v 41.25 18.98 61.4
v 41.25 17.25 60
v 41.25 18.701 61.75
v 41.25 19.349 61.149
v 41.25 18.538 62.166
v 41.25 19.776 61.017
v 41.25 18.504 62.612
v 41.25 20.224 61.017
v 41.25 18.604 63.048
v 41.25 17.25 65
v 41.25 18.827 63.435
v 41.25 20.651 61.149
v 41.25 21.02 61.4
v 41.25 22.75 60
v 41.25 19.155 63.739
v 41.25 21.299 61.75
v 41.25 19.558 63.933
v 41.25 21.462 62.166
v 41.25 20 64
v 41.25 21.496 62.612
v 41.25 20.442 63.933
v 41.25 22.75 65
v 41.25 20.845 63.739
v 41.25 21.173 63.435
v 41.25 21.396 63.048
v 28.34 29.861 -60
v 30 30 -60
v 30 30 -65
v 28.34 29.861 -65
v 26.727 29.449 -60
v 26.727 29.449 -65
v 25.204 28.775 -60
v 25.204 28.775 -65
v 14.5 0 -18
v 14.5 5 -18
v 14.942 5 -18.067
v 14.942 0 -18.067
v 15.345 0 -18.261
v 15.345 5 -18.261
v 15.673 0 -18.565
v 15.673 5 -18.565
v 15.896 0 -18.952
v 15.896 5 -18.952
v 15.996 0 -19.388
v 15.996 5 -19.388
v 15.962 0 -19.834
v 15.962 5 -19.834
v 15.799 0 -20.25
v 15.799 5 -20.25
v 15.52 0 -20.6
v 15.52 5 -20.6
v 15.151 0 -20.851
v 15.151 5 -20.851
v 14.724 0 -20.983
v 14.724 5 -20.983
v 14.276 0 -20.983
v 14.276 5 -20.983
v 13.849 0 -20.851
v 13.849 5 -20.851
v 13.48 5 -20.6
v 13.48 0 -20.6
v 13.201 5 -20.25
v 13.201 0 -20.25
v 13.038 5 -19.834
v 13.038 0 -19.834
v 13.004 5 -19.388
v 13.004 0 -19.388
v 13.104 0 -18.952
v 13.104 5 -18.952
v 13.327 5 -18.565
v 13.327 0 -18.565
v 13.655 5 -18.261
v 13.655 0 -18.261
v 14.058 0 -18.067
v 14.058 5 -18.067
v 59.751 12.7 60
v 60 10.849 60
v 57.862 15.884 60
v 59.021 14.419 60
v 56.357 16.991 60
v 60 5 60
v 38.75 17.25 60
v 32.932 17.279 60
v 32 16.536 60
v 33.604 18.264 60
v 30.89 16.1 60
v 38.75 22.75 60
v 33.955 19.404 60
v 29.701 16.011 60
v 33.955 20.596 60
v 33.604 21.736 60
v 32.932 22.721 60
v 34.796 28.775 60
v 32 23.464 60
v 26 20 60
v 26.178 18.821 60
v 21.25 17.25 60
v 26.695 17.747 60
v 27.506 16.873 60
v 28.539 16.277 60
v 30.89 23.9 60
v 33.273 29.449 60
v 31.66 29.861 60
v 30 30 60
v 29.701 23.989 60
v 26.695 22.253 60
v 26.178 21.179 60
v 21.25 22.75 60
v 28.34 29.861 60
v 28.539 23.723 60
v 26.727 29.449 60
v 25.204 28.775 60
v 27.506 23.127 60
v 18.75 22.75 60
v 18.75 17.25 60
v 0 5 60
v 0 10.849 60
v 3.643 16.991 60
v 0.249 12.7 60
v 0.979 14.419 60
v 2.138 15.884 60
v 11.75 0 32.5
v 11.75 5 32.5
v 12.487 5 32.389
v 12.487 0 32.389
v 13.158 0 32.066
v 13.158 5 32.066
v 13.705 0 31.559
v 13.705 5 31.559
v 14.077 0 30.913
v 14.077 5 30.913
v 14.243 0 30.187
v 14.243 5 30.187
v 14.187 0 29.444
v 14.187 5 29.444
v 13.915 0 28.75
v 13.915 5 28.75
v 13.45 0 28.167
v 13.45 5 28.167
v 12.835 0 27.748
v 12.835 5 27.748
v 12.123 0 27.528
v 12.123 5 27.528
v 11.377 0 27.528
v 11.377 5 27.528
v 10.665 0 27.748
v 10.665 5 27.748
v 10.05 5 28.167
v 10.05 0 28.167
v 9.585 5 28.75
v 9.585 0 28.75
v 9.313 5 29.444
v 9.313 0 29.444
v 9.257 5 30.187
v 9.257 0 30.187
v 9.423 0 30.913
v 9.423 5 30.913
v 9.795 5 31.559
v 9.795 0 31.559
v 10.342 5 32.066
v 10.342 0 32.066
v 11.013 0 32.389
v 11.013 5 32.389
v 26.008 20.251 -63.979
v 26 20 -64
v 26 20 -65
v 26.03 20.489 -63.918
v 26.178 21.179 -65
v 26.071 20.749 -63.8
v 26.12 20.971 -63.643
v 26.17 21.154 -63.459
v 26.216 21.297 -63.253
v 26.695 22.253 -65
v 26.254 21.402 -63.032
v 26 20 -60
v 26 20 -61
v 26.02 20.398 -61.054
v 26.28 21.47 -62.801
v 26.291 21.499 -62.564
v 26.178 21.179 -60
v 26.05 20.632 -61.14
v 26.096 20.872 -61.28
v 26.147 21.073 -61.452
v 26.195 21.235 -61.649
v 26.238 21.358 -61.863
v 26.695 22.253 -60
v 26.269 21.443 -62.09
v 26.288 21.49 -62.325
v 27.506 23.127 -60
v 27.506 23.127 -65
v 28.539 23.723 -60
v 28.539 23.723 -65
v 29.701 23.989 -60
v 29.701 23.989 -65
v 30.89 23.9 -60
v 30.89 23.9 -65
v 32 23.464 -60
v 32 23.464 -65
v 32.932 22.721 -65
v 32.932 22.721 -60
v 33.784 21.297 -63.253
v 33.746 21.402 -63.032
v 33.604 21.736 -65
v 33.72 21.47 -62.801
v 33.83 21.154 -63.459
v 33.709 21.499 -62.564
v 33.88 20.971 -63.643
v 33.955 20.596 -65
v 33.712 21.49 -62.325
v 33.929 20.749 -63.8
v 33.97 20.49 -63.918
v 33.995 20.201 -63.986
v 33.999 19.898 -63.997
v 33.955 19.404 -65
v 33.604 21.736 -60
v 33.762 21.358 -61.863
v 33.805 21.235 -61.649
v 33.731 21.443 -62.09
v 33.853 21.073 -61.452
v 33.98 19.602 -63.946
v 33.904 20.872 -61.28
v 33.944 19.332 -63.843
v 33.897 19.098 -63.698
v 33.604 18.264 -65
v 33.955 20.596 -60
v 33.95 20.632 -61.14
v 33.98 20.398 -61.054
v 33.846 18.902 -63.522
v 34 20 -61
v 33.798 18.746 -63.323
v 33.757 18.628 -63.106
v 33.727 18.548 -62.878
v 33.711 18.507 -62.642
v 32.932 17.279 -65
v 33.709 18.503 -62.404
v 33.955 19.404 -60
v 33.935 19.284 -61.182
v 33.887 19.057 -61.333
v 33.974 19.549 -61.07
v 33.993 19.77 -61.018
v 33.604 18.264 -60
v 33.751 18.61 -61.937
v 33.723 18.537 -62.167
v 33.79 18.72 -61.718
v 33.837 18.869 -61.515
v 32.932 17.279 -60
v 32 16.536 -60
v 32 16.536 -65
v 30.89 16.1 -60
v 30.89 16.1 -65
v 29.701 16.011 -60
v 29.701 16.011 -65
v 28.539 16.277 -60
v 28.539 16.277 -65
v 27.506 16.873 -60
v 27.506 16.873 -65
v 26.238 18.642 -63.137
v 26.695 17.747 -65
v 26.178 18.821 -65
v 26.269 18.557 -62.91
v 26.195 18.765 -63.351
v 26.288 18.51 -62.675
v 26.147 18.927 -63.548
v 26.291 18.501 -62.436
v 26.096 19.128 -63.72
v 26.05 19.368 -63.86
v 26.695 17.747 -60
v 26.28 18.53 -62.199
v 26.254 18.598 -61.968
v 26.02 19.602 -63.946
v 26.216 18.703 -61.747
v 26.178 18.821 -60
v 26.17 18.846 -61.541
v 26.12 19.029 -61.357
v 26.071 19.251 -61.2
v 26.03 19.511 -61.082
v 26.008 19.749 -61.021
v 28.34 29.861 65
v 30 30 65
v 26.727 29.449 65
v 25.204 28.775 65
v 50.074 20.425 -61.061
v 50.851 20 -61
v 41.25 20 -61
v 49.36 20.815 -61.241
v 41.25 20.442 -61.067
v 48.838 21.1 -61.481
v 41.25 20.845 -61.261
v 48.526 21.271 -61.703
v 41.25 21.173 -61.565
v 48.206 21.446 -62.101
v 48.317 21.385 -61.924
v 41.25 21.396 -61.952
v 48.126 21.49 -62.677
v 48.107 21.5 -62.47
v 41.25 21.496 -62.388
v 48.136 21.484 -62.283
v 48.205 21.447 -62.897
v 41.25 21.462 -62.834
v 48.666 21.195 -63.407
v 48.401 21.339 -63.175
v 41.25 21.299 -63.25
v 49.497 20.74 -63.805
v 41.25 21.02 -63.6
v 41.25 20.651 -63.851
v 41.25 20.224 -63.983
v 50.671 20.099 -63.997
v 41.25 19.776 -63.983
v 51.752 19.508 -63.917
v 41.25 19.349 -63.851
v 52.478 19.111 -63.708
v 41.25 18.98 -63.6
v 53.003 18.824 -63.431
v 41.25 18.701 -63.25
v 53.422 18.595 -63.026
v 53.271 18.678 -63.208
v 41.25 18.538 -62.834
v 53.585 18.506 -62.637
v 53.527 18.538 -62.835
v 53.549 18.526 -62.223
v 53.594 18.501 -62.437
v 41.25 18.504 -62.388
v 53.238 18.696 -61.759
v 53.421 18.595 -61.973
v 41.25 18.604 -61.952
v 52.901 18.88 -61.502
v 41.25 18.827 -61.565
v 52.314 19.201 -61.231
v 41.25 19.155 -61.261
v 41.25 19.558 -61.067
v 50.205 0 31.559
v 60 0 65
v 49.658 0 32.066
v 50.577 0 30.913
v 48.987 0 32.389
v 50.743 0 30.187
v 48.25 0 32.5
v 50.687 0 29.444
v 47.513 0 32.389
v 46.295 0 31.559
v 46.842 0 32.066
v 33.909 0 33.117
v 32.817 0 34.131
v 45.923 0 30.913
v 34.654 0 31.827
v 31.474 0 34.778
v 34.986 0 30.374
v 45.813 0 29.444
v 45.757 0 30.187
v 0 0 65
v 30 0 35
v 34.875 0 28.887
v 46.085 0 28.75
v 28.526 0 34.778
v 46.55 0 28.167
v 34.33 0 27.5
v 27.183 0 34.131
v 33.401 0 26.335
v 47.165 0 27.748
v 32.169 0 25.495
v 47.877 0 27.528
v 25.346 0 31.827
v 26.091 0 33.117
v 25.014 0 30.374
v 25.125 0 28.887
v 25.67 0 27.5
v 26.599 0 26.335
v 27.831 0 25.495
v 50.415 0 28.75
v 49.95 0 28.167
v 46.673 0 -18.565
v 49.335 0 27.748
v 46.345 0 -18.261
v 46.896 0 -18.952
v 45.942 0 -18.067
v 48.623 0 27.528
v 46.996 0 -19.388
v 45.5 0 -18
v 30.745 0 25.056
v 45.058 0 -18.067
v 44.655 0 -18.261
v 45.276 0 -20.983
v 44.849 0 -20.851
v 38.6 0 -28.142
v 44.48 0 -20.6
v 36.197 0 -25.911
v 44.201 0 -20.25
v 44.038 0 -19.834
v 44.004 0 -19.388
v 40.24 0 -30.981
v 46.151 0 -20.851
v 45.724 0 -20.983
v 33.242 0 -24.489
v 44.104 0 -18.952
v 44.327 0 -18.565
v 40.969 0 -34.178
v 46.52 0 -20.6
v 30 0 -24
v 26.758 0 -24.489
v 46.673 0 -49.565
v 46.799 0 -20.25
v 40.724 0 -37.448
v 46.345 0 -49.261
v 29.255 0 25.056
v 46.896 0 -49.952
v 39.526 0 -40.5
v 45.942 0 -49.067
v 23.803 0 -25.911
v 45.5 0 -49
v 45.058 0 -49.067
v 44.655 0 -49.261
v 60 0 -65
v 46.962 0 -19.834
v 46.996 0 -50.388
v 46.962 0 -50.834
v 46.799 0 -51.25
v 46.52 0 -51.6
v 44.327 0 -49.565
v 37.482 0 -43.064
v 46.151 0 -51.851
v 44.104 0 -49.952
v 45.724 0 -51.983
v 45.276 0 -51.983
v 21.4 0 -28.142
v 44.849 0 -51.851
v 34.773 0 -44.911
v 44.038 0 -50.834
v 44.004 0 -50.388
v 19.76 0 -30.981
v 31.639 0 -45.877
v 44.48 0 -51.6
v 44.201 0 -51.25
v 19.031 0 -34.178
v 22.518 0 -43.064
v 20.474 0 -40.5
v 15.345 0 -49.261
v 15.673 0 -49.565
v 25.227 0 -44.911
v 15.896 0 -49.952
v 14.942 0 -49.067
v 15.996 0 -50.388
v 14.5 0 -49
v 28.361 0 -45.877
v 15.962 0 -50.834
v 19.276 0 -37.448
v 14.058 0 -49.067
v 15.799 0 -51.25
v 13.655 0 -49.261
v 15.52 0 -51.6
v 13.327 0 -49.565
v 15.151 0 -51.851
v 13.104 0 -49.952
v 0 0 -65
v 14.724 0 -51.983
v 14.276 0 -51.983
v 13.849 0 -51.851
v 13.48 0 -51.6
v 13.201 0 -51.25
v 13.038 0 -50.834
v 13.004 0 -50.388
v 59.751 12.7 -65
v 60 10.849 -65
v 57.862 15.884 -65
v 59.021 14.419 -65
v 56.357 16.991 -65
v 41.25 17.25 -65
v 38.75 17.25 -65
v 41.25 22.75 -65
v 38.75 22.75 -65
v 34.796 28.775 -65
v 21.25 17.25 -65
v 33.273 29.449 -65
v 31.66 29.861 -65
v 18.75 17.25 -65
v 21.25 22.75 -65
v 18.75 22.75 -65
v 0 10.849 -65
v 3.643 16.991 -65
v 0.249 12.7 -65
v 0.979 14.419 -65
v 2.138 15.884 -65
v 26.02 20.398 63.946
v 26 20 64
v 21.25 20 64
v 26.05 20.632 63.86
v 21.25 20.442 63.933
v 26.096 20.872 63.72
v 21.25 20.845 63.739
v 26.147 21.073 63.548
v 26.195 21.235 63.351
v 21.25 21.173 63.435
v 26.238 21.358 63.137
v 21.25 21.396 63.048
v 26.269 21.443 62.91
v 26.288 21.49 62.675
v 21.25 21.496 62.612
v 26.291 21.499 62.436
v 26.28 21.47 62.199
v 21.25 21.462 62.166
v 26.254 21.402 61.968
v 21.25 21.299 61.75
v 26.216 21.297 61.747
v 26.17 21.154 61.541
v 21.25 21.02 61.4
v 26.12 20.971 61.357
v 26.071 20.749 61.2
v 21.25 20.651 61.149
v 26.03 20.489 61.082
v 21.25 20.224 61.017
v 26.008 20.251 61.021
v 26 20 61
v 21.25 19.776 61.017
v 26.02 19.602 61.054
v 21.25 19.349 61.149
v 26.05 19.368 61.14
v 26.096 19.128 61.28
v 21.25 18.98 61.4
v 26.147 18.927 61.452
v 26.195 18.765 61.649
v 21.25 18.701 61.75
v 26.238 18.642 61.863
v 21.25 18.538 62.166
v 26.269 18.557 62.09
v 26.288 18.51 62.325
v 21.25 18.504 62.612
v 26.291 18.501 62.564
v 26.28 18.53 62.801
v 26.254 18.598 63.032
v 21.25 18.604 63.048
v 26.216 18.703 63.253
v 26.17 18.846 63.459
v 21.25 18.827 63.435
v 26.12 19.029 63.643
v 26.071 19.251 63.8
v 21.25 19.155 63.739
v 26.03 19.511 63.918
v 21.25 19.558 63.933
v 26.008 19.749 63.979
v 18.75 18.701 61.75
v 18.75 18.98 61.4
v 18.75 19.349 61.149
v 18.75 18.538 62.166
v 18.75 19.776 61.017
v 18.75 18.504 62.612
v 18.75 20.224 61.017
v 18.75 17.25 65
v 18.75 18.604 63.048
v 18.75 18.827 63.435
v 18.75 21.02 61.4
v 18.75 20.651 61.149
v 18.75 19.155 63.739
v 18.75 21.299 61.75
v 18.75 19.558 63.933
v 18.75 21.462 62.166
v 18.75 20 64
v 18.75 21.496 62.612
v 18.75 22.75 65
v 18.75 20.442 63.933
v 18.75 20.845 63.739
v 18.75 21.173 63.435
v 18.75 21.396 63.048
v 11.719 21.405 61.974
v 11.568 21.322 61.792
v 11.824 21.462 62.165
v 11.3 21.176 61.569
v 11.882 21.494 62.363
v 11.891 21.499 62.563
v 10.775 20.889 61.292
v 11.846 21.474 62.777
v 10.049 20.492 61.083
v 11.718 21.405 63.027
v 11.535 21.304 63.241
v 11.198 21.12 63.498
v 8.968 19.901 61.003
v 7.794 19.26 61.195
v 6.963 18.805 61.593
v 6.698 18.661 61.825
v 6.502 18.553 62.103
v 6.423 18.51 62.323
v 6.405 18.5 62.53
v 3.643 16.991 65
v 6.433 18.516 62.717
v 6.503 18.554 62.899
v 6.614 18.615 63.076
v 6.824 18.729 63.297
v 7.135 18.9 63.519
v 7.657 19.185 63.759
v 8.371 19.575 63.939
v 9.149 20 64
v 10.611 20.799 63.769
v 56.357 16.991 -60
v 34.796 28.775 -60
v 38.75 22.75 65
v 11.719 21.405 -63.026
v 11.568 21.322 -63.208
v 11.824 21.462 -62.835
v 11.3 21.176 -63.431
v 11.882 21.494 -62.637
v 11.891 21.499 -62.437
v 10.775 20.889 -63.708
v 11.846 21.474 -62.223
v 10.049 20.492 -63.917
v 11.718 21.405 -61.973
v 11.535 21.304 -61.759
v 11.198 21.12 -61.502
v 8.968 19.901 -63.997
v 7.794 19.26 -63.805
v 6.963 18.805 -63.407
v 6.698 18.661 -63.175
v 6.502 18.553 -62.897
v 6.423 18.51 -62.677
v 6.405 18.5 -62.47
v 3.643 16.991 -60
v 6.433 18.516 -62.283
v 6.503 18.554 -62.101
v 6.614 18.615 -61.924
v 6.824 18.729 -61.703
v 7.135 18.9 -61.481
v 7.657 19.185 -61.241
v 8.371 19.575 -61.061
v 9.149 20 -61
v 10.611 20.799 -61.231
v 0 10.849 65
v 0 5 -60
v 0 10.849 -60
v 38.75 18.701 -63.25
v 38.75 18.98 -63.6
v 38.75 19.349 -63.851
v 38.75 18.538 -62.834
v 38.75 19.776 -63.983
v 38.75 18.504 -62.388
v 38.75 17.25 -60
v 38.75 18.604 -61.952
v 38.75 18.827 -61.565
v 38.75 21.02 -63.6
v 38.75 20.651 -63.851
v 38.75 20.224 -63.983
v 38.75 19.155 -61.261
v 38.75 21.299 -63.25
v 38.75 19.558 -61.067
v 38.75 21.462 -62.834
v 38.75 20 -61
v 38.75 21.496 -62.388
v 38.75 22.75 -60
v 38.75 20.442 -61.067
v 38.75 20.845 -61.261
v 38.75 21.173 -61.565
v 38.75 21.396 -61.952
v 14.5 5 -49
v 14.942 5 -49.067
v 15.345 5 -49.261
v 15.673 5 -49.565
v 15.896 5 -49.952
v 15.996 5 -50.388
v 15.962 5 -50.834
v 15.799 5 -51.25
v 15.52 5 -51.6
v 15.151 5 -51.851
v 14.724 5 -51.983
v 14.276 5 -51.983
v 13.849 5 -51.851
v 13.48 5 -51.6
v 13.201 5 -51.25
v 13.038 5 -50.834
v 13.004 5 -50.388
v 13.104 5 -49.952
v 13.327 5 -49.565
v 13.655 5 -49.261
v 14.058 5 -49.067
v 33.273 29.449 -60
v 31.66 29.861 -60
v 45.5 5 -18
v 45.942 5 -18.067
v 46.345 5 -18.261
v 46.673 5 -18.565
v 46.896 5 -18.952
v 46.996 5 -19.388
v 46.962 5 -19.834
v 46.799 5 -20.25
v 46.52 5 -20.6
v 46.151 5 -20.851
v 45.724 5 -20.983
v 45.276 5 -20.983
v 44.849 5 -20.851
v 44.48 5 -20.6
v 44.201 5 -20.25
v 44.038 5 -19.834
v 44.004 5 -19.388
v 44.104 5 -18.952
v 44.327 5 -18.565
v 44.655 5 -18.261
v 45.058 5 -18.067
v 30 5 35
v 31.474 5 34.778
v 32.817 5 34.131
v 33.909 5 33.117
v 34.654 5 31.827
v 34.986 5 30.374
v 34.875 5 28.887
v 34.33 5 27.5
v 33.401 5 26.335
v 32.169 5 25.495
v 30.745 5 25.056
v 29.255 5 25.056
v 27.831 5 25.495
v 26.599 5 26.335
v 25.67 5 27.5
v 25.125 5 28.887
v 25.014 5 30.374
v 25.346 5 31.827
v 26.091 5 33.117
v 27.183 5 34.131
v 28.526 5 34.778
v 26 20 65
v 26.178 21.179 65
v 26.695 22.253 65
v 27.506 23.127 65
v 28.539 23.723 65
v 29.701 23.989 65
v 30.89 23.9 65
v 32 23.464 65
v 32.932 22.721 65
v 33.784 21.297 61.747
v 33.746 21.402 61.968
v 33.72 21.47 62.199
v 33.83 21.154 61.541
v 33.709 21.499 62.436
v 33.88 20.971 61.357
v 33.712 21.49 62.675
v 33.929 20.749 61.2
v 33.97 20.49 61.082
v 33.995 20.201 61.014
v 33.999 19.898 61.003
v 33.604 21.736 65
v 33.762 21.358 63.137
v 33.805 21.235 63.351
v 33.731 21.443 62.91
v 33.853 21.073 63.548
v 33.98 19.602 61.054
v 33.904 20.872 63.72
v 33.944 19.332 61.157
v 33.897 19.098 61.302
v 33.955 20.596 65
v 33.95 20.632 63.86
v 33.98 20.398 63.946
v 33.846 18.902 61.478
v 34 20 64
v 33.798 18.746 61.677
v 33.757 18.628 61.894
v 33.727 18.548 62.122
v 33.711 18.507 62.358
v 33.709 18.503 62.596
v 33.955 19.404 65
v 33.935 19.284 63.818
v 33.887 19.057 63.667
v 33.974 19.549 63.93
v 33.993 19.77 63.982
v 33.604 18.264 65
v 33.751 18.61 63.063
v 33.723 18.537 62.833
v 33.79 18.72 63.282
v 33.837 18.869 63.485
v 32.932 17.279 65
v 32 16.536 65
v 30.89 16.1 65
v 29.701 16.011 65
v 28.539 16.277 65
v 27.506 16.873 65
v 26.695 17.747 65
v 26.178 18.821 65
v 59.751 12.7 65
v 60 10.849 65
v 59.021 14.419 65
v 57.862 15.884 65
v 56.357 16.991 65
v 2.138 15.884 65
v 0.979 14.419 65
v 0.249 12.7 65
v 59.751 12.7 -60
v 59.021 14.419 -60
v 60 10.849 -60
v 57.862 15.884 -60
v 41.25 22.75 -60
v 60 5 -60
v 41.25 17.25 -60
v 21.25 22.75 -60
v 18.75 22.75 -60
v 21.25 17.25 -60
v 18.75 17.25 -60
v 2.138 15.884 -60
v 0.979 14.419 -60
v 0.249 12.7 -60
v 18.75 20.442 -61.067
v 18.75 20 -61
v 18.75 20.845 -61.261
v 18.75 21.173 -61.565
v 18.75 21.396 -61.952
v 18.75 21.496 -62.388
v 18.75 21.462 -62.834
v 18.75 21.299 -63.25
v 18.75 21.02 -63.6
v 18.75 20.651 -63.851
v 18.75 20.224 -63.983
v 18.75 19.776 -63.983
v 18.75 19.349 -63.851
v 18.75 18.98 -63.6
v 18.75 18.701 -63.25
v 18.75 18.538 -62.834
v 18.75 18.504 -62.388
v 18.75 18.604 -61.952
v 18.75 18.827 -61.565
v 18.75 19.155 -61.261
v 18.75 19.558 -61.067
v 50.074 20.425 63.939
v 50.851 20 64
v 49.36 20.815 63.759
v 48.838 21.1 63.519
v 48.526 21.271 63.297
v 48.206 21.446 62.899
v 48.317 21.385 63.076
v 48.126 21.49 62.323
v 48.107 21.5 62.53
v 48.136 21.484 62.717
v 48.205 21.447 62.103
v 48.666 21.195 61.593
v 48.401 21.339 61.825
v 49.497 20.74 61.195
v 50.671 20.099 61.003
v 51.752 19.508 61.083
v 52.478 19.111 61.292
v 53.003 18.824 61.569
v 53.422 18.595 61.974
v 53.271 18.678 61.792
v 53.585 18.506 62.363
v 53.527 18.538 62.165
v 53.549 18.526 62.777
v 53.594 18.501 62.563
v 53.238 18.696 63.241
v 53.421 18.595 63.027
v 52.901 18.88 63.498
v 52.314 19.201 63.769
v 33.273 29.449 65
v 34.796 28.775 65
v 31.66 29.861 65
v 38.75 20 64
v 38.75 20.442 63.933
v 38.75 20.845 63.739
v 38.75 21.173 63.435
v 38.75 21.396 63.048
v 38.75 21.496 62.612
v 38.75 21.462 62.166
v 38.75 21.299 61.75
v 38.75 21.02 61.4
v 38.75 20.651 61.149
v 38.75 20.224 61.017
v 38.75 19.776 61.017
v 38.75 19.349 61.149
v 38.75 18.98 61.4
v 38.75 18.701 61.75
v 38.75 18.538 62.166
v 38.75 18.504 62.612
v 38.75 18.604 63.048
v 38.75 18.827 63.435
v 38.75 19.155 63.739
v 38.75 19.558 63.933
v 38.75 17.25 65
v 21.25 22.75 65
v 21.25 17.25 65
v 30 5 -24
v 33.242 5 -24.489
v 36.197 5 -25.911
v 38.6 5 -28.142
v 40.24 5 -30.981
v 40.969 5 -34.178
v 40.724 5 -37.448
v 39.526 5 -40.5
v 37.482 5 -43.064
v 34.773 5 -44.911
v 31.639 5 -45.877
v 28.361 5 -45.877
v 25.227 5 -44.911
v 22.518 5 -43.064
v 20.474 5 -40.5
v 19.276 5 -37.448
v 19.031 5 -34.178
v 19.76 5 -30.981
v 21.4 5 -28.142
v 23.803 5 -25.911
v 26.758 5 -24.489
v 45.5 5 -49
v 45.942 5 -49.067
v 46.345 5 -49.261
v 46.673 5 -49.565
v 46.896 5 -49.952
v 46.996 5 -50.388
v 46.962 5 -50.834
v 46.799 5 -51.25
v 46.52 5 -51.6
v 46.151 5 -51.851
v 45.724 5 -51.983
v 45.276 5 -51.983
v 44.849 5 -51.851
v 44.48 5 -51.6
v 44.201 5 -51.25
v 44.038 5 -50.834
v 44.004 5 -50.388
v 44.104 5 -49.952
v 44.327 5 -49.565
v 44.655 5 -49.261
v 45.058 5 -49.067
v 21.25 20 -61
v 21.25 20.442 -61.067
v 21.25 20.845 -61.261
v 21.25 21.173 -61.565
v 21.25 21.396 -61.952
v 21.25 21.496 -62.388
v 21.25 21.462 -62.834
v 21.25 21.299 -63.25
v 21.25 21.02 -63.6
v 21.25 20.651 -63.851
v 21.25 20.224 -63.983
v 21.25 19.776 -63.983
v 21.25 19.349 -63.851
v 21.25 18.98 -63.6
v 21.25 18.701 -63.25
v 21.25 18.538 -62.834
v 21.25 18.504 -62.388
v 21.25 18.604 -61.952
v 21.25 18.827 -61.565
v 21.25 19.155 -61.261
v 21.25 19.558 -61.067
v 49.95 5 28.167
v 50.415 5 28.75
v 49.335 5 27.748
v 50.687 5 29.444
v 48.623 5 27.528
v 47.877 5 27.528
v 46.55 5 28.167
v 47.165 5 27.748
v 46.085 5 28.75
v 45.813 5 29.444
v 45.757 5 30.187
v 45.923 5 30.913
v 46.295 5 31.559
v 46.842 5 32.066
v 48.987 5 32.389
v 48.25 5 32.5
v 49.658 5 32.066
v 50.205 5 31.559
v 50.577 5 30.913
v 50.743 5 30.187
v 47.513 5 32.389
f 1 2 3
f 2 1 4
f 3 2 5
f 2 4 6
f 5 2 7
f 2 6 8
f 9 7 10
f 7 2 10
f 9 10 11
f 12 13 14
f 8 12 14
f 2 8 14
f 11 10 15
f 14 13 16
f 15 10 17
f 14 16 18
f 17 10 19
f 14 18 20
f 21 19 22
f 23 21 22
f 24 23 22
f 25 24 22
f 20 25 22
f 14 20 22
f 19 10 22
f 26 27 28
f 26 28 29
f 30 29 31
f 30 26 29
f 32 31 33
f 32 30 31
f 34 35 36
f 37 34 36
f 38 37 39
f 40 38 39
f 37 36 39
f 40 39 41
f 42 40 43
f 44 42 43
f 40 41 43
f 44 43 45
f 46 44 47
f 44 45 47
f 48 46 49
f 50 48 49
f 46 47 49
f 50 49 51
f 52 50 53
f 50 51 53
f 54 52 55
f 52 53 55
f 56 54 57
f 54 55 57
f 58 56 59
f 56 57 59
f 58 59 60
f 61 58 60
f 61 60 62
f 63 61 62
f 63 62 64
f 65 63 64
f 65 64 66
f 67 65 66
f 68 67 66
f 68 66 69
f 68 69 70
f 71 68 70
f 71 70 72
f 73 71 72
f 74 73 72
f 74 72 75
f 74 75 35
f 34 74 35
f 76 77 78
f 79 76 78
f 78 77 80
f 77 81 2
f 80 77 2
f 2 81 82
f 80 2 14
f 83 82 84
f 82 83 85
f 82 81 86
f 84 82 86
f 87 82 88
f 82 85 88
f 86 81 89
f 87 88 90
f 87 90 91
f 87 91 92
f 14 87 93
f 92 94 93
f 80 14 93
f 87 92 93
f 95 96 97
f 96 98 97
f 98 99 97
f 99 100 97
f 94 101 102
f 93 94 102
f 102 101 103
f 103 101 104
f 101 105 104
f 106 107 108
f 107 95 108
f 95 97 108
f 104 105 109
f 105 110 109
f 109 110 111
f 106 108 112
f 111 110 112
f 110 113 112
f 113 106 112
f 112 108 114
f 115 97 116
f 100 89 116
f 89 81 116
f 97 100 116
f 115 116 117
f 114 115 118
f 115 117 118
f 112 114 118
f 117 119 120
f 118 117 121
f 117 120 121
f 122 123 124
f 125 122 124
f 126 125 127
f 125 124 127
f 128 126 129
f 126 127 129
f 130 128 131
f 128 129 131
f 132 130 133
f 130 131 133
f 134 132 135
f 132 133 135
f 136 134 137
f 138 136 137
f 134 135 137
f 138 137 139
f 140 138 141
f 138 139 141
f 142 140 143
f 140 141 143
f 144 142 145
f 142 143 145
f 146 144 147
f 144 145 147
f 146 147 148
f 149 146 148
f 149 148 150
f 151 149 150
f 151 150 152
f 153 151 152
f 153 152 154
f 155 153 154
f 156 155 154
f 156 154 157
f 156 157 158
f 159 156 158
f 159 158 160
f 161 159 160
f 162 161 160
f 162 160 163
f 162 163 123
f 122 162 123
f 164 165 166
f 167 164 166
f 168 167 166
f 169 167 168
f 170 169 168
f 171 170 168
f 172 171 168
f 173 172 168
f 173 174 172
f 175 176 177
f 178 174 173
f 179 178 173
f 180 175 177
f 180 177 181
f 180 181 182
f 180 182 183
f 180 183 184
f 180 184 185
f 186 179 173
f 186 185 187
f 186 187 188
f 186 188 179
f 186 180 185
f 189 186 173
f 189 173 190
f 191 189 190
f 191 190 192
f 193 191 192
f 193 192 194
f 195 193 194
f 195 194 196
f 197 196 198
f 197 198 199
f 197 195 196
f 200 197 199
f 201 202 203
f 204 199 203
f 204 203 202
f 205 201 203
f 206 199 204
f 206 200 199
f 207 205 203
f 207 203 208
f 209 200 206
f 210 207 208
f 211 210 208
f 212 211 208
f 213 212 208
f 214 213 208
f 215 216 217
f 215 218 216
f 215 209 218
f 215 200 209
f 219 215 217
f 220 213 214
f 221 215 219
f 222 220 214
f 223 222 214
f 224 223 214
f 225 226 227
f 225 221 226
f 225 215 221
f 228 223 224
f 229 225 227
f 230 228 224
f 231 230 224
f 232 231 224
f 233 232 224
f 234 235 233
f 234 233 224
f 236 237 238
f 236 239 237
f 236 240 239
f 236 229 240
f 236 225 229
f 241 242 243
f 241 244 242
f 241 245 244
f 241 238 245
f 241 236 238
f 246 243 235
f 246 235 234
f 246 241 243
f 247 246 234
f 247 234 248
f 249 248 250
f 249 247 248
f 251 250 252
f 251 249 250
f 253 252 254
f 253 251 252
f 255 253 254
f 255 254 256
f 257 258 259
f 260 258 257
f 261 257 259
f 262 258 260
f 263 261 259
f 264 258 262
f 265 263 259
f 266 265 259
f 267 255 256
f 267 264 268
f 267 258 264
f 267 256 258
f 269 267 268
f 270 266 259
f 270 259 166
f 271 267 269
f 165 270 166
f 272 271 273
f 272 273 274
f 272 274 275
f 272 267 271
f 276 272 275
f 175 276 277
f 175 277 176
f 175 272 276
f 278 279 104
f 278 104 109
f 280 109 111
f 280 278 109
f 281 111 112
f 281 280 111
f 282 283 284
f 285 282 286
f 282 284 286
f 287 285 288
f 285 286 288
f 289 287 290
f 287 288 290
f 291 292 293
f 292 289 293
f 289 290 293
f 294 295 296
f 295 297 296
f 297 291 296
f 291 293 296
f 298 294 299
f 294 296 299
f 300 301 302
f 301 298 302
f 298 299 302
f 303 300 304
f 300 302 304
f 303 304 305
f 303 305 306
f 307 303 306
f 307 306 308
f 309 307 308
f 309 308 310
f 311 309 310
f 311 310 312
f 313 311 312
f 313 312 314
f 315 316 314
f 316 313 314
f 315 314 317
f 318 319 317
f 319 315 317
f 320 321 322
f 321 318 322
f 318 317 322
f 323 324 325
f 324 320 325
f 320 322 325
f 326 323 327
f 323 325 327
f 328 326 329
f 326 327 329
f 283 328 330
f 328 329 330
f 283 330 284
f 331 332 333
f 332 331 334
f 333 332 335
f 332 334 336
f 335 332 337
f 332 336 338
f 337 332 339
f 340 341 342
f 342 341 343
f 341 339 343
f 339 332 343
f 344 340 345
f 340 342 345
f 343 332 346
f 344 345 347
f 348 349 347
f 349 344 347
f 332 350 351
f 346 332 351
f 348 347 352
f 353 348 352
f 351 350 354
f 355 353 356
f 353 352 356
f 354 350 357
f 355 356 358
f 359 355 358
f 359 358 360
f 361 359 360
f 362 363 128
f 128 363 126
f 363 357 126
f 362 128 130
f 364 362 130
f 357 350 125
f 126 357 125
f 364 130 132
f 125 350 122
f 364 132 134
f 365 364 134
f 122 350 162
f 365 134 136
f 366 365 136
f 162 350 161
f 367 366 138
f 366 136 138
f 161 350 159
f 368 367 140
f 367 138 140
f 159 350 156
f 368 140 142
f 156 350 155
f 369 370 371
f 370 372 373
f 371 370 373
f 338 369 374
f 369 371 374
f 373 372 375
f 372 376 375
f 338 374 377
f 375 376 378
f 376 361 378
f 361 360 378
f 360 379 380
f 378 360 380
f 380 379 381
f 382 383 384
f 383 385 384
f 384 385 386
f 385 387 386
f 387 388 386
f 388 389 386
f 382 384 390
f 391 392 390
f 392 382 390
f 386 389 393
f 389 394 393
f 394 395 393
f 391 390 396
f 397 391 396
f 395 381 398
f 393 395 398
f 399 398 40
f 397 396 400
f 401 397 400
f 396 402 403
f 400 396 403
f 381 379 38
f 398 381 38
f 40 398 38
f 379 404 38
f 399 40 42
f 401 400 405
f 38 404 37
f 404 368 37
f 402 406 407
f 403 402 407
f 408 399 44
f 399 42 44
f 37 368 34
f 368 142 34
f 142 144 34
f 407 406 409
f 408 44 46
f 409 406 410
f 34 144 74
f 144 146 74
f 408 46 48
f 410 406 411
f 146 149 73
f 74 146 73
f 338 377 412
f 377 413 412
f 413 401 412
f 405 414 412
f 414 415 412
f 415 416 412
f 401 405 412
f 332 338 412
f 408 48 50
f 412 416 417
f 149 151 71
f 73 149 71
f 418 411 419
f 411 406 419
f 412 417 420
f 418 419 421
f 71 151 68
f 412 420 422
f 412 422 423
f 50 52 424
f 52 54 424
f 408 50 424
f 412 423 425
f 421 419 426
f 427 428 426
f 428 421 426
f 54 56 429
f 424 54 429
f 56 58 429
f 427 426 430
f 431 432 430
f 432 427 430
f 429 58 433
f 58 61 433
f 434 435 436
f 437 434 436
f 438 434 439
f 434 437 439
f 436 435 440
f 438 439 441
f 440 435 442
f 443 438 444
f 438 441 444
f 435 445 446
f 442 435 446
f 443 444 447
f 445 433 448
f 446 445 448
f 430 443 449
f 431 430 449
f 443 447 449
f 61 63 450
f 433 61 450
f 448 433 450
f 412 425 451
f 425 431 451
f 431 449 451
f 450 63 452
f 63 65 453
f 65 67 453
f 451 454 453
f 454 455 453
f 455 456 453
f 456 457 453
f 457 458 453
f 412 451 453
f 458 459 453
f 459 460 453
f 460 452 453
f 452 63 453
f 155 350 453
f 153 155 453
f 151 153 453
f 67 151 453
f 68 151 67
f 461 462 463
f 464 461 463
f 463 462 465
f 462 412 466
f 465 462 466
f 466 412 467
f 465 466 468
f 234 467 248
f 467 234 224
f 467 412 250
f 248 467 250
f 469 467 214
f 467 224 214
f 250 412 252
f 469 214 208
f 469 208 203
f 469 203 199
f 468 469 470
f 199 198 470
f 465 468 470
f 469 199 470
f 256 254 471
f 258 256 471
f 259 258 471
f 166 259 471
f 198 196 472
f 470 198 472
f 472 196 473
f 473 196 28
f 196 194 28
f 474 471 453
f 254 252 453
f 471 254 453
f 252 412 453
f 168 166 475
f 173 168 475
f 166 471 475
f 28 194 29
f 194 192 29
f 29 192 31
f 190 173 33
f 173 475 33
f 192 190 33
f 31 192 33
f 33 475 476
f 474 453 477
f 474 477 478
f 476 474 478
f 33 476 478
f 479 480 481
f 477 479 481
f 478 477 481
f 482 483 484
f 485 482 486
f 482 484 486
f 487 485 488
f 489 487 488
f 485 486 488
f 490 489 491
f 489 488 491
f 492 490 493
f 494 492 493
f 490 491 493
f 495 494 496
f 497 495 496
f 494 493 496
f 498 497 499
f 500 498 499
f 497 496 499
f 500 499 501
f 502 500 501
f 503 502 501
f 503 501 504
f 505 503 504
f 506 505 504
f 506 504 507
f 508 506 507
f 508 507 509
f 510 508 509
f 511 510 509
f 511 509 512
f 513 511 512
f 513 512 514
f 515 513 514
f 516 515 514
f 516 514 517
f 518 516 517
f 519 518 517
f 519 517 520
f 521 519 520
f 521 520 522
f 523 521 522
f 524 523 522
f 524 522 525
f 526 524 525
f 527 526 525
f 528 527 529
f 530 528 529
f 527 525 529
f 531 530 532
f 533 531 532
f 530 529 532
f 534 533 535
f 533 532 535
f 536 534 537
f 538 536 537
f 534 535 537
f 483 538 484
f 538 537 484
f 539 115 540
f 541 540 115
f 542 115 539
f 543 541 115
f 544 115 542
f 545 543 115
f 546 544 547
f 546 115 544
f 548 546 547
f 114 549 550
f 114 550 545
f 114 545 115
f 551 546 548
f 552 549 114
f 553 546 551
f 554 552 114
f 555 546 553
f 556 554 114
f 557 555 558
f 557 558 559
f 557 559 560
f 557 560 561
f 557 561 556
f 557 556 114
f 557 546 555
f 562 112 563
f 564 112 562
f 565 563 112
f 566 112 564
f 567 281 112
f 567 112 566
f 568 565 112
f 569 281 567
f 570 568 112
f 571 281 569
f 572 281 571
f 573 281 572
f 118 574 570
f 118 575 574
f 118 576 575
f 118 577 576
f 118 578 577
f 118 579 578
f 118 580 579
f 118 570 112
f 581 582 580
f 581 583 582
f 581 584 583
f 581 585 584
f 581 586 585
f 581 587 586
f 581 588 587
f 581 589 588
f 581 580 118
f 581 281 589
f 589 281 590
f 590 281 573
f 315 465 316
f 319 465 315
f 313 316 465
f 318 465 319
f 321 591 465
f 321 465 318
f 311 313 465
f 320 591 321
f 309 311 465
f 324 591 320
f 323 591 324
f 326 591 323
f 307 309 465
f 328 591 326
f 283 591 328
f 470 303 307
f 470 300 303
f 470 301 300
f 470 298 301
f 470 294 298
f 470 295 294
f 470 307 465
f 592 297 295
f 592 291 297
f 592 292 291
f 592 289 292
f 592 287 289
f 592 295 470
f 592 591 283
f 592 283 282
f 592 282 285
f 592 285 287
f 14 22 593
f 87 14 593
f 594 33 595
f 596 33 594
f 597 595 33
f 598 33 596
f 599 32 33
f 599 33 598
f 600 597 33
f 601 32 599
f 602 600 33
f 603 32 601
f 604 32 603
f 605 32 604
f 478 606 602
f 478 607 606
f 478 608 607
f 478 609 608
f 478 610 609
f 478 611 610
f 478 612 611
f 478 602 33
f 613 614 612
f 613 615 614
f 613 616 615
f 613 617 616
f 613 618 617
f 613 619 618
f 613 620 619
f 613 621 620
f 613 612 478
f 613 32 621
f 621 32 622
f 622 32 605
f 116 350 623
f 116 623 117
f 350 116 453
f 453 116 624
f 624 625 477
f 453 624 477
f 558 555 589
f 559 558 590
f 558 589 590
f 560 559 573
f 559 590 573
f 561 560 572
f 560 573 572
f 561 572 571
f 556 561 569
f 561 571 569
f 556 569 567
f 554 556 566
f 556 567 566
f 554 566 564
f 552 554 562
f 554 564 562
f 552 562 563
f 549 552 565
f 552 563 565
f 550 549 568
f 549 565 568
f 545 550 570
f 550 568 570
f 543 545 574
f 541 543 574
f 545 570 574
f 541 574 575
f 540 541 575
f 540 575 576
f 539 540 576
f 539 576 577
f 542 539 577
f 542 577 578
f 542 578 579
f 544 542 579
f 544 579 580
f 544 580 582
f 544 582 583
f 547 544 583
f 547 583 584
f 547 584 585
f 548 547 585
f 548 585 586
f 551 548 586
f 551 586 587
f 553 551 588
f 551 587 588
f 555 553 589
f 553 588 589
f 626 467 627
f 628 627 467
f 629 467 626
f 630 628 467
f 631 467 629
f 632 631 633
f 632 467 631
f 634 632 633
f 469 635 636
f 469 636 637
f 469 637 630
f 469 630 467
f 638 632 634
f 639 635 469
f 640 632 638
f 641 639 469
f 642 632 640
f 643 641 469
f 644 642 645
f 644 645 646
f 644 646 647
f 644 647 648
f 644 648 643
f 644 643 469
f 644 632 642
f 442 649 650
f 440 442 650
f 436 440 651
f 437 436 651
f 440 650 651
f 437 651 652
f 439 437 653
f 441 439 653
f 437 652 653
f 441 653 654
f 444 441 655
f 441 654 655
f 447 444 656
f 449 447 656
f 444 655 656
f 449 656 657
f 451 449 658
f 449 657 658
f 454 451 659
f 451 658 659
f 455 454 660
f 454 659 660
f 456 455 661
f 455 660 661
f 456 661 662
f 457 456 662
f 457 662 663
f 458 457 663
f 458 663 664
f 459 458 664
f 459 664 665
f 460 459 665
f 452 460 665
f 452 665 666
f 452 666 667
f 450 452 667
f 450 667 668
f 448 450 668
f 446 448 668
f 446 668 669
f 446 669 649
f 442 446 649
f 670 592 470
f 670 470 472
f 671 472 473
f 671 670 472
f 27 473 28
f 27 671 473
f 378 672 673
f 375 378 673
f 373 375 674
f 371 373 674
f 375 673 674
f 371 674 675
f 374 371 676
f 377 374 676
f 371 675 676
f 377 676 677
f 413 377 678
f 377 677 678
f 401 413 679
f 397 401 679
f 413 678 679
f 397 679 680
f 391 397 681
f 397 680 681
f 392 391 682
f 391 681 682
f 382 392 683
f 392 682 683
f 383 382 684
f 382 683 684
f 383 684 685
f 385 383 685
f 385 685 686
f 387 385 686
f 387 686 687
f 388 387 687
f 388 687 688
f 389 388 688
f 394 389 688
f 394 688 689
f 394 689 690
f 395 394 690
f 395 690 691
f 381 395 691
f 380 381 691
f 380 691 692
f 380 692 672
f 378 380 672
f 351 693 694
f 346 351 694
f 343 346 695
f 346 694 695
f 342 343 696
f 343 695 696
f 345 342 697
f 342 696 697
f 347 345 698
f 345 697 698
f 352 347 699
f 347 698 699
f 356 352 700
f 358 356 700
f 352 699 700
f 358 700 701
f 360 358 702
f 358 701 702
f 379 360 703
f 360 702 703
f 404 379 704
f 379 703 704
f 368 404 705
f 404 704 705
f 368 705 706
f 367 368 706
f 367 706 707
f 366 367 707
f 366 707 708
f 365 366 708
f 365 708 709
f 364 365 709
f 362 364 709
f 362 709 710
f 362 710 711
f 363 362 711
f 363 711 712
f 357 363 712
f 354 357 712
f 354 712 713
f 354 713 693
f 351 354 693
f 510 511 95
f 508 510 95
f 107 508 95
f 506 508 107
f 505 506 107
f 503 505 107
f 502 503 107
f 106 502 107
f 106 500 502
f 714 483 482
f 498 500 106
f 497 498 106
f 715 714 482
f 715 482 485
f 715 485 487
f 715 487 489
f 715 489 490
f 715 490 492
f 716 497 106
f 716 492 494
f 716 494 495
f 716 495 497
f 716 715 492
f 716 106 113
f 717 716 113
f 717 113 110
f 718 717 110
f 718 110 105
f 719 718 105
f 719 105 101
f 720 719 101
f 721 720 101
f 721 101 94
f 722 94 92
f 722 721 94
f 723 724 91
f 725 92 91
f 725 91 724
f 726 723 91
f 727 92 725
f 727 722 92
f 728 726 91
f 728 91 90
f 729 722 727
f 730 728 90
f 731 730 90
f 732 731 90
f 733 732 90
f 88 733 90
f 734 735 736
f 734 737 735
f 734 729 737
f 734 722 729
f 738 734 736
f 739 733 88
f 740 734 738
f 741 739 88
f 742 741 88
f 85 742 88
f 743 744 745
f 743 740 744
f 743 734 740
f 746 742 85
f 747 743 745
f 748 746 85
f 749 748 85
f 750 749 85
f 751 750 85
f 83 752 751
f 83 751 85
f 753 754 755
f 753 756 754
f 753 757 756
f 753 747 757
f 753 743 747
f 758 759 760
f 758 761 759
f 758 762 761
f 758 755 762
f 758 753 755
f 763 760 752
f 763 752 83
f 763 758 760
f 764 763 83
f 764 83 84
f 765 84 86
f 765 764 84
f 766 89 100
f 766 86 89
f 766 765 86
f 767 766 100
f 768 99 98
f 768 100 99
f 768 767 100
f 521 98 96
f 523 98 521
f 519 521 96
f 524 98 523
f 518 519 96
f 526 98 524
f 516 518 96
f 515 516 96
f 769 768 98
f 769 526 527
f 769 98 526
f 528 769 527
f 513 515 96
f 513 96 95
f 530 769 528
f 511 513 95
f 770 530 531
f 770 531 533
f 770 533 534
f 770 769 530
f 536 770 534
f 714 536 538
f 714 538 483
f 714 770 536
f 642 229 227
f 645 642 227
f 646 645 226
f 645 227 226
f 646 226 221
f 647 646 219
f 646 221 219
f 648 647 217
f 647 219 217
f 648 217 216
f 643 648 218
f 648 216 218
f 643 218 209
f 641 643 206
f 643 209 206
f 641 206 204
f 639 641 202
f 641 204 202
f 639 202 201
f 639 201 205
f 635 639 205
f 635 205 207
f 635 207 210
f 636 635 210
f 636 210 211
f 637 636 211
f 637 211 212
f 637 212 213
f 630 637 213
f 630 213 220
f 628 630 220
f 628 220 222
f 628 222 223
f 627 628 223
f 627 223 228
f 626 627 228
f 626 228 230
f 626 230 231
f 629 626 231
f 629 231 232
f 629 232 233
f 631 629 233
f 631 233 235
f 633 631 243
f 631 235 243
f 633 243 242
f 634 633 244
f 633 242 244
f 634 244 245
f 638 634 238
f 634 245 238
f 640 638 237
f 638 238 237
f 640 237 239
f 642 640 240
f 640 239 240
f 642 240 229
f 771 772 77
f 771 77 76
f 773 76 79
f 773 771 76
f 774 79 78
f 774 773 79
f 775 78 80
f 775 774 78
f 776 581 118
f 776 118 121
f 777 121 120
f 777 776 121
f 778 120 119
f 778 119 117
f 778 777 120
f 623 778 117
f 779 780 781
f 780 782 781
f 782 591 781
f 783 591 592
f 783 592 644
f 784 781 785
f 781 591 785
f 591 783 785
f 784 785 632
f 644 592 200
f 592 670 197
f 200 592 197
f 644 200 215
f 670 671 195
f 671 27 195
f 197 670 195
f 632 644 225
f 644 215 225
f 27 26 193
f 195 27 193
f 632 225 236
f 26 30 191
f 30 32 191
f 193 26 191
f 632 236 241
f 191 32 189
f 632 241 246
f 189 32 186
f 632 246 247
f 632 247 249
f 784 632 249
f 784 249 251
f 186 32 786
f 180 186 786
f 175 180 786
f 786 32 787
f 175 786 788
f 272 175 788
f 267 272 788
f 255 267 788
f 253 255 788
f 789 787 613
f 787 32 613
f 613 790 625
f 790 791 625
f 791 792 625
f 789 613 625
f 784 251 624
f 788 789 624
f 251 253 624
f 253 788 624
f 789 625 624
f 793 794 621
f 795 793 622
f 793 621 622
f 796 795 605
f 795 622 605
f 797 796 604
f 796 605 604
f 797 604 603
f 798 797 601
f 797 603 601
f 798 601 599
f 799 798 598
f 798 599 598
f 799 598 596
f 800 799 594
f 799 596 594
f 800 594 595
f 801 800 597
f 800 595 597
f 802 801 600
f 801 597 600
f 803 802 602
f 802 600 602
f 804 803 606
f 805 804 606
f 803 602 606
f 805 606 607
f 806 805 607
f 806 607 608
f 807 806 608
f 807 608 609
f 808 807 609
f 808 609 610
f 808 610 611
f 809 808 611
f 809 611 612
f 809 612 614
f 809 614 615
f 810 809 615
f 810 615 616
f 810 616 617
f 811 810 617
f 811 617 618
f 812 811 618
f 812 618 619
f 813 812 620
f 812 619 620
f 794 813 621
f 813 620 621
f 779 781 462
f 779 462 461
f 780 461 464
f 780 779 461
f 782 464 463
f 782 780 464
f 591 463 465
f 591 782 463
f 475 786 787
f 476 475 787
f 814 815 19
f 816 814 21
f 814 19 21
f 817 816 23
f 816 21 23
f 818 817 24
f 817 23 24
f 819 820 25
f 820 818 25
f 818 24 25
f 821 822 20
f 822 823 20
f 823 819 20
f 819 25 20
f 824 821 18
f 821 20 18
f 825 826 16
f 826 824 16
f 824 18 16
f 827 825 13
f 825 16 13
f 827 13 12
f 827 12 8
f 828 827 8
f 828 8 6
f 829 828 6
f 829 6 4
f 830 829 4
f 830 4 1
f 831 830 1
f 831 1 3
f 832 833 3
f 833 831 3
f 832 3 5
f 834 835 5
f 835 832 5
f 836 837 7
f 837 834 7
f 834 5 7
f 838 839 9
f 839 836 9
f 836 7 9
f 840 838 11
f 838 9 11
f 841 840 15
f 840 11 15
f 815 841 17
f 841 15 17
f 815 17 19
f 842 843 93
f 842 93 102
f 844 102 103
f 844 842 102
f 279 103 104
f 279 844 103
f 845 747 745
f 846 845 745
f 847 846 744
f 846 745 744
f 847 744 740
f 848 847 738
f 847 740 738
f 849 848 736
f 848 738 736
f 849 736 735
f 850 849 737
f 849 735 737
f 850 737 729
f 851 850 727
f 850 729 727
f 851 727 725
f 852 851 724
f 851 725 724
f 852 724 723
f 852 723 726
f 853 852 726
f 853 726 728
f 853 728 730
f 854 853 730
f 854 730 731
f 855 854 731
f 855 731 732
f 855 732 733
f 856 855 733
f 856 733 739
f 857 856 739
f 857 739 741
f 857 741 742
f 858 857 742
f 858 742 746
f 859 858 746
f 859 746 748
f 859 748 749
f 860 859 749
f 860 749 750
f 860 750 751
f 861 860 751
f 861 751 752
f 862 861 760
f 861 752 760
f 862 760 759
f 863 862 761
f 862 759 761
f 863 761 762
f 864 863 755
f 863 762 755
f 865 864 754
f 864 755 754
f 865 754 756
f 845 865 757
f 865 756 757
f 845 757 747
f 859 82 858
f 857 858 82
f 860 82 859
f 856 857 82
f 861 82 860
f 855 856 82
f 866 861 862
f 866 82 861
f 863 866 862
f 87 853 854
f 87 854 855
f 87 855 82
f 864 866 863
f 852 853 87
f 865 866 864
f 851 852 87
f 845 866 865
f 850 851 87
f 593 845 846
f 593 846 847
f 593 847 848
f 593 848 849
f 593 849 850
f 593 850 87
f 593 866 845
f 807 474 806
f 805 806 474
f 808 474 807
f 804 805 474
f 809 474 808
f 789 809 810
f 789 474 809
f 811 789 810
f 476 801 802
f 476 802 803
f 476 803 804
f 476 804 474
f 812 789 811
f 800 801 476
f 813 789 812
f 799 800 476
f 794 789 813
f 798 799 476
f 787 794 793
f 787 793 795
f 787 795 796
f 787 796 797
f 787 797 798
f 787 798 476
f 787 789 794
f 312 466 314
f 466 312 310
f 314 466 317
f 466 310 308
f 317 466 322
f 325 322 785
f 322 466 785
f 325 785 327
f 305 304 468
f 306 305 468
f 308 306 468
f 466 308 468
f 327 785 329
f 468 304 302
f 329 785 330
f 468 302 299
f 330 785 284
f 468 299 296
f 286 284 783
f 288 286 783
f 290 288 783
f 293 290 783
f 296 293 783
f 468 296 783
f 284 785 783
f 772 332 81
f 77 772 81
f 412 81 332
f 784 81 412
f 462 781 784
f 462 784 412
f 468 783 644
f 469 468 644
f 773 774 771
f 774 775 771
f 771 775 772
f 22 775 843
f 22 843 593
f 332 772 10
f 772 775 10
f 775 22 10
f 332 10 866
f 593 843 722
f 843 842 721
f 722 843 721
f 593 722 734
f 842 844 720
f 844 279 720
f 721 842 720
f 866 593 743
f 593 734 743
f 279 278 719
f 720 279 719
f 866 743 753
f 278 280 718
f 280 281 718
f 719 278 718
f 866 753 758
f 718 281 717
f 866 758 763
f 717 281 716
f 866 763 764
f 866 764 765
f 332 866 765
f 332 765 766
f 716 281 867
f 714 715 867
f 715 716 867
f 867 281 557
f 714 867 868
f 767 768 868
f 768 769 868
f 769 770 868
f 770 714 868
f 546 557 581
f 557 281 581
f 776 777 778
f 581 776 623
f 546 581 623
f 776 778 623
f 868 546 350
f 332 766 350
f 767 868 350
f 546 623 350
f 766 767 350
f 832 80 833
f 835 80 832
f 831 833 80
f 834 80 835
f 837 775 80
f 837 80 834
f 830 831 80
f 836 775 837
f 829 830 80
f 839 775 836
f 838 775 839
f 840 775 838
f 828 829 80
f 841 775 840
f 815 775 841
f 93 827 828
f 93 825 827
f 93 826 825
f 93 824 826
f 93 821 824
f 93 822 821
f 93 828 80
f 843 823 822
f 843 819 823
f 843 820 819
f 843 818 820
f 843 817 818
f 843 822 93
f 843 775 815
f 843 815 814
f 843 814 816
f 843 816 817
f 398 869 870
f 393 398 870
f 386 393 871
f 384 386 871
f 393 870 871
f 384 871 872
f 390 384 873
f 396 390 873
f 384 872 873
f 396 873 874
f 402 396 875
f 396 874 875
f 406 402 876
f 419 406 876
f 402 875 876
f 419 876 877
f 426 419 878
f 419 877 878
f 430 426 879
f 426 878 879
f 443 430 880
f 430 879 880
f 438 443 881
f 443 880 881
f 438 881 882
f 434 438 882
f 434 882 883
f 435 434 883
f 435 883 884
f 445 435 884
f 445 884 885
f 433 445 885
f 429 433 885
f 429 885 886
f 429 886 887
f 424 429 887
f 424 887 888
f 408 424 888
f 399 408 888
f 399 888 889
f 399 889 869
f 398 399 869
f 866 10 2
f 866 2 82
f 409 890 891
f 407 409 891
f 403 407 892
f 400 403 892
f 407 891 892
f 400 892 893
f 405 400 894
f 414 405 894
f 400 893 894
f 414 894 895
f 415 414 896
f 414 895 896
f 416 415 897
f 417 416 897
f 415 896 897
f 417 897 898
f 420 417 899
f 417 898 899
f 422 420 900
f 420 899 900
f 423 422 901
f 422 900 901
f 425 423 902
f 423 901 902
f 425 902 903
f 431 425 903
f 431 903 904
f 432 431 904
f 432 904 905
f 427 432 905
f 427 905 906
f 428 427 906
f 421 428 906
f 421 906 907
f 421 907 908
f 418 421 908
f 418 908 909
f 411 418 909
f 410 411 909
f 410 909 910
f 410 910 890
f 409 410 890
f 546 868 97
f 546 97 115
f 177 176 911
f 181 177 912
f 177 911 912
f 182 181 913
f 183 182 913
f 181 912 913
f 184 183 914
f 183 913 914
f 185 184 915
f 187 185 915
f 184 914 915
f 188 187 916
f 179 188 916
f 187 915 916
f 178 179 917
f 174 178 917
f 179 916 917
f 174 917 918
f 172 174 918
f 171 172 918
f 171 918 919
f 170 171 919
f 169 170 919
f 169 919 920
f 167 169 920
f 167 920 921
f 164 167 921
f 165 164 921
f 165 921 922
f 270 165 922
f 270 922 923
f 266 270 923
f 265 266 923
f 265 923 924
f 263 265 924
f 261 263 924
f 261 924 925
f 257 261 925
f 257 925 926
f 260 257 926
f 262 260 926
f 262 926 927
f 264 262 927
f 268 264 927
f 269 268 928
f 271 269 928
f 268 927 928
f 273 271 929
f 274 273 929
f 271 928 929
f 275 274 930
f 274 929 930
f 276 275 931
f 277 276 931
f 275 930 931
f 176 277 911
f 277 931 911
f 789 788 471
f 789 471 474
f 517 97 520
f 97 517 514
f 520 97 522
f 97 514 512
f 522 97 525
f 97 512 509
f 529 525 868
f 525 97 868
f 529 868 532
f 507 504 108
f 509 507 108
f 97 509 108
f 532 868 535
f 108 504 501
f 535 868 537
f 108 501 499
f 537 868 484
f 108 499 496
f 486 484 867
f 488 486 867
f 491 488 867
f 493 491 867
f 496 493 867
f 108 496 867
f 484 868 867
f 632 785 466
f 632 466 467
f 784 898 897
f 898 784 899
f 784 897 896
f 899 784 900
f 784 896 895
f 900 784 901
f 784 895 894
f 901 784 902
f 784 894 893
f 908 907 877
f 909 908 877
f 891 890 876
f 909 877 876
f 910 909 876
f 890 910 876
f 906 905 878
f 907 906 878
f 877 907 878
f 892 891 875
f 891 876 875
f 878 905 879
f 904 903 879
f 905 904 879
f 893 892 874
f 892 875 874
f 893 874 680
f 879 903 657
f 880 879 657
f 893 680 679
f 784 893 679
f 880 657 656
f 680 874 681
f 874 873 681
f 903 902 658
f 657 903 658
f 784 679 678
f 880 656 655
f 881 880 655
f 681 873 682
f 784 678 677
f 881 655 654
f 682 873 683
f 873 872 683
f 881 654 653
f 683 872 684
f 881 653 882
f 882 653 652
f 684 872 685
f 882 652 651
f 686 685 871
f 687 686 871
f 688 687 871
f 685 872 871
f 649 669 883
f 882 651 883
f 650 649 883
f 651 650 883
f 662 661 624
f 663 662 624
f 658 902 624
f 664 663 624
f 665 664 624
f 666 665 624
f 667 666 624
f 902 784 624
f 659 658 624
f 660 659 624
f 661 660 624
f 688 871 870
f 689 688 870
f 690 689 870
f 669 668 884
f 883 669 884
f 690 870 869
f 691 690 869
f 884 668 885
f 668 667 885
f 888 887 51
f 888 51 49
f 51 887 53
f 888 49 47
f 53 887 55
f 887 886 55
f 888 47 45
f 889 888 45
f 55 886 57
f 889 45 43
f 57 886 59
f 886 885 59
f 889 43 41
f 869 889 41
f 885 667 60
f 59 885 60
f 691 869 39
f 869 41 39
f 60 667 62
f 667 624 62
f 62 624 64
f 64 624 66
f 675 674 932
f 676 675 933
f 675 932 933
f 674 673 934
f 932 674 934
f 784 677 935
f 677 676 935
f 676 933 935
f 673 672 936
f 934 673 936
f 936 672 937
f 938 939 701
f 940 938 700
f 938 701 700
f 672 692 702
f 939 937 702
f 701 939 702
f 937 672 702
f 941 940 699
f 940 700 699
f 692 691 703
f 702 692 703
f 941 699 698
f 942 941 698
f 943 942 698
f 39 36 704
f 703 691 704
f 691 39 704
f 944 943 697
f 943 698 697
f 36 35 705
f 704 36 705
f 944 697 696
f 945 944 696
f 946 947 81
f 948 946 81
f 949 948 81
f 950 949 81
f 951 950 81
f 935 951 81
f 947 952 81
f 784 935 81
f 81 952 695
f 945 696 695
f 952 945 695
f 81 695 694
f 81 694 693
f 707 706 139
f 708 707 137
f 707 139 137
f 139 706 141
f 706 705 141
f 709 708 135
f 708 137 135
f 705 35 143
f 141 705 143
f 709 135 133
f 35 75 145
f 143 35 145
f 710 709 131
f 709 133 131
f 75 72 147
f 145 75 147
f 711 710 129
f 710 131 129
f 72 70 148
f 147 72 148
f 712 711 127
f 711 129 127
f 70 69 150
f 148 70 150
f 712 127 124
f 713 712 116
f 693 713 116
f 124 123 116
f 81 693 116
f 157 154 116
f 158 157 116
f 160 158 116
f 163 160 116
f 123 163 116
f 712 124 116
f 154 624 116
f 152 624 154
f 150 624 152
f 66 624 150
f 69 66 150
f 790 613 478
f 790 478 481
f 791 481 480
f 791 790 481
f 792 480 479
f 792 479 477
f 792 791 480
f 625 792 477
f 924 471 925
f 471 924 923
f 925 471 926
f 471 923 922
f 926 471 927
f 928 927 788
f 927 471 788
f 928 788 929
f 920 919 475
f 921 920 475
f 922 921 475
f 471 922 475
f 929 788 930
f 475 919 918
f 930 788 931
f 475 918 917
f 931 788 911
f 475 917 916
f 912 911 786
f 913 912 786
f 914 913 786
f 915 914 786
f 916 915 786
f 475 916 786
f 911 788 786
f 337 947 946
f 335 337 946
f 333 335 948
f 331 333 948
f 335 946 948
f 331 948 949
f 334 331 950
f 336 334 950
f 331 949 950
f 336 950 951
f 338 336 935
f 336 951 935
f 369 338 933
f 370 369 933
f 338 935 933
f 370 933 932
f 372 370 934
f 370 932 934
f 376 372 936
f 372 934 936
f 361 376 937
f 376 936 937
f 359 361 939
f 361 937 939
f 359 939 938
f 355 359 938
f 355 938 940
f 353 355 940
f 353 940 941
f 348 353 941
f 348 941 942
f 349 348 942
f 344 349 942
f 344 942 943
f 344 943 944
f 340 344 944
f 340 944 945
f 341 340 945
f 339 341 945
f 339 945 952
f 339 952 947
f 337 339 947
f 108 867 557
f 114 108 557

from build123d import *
from OCP.BRepAlgoAPI import BRepAlgoAPI_Cut
from OCP.TopTools import TopTools_ListOfShape

# Parameters (mm, degrees)
BOSS_EXTRUDE1_DEPTH    = 60
CUT_EXTRUDE1_START     = -130
CUT_EXTRUDE1_OUTLINE_R = 4
CUT_EXTRUDE1_OUTLINE_W = 2.5
CUT_EXTRUDE1_OUTLINE_H = 5.5
CUT_EXTRUDE1_DEPTH     = 130
CUT_EXTRUDE2_REACH     = 93.924
SKETCH3_R              = 11
SKETCH3_R_2            = 1.5
SKETCH3_R_3            = 5
SKETCH3_R_4            = 2.5
SKETCH4_R              = 1.5
CUT_EXTRUDE3_DEPTH     = 94.407708115


with BuildPart() as part:
    # Sketch1 → Boss-Extrude1 (new body)
    with BuildSketch(Plane(origin=(0, 0, 0), x_dir=(0, 0, -1), z_dir=(1, 0, 0))):
        Polygon((-65, 0), (65, 0), (65, 30), (60, 30), (60, 5), (-60, 5), (-60, 30), (-65, 30), align=None)
    extrude(amount=BOSS_EXTRUDE1_DEPTH)


with BuildPart() as cut_extrude1_tool:
    # Cut-Extrude1: read off the stored shape, not the designer's step
    # Cut-Extrude1 outline → Cut-Extrude1 (new body)
    with BuildSketch(Plane(origin=(0, 0, -65), x_dir=(-1, 0, 0), z_dir=(0, 0, -1)).offset(CUT_EXTRUDE1_START)):
        with BuildLine():
            Line((0, 30), (-30, 29.999998923))
            ThreePointArc((-30, 29.999998923), (-27.525092827, 29.688901535), (-25.204173103, 28.774965689))
            Line((-25.204173103, 28.774965689), (-3.642920811, 16.99098415))
            ThreePointArc((-3.642920811, 16.99098415), (-0.979221216, 14.419252925), (0, 10.848507507))
            Line((0, 10.848507507), (0, 30))
        make_face()
        with BuildLine():
            ThreePointArc((-60, 10.848507507), (-59.020778784, 14.419252925), (-56.357079189, 16.99098415))
            Line((-56.357079189, 16.99098415), (-34.795826897, 28.774965689))
            ThreePointArc((-34.795826897, 28.774965689), (-32.474907173, 29.688901535), (-30, 29.999998923))
            Line((-30, 29.999998923), (-60, 30))
            Line((-60, 30), (-60, 10.848507507))
        make_face()
        with Locations((-30, 20)):
            Circle(CUT_EXTRUDE1_OUTLINE_R)
        with Locations((-20, 20)):
            Rectangle(CUT_EXTRUDE1_OUTLINE_W, CUT_EXTRUDE1_OUTLINE_H)
        with Locations((-40, 20)):
            Rectangle(CUT_EXTRUDE1_OUTLINE_W, CUT_EXTRUDE1_OUTLINE_H)
    extrude(amount=CUT_EXTRUDE1_DEPTH)


with BuildPart() as part_1:
    add(part.part)

    # Cut-Extrude1: cut by cut_extrude1_tool, with a tolerance
    cut_extrude1_stock = TopTools_ListOfShape()
    cut_extrude1_stock.Append(part_1.part.wrapped)
    cut_extrude1_tools = TopTools_ListOfShape()
    cut_extrude1_tools.Append(cut_extrude1_tool.part.wrapped)
    cut_extrude1_cut = BRepAlgoAPI_Cut()
    cut_extrude1_cut.SetArguments(cut_extrude1_stock)
    cut_extrude1_cut.SetTools(cut_extrude1_tools)
    cut_extrude1_cut.SetFuzzyValue(0.00001)
    cut_extrude1_cut.Build()
    add(Compound.cast(cut_extrude1_cut.Shape()).solids(), mode=Mode.REPLACE)

    # Sketch3 → Cut-Extrude2 (cut, up to next)
    with BuildSketch(Plane(origin=(0, 5, 0), x_dir=(1, 0, 0), z_dir=(0, 1, 0)), mode=Mode.PRIVATE) as cut_extrude2_sk1:
        with Locations(Location((30, 35, 0), (0, 0, 270))):
            Circle(SKETCH3_R)
    cut_extrude2_tool1 = extrude(cut_extrude2_sk1.sketch, amount=-CUT_EXTRUDE2_REACH, mode=Mode.PRIVATE) & part_1.part
    # Sketch3 → Cut-Extrude2 (cut, up to next)
    with BuildSketch(Plane(origin=(0, 5, 0), x_dir=(1, 0, 0), z_dir=(0, 1, 0)), mode=Mode.PRIVATE) as cut_extrude2_sk2:
        with Locations(Location((45.5, 19.5, 0), (0, 0, 270))):
            Circle(SKETCH3_R_2)
    cut_extrude2_tool2 = extrude(cut_extrude2_sk2.sketch, amount=-CUT_EXTRUDE2_REACH, mode=Mode.PRIVATE) & part_1.part
    # Sketch3 → Cut-Extrude2 (cut, up to next)
    with BuildSketch(Plane(origin=(0, 5, 0), x_dir=(1, 0, 0), z_dir=(0, 1, 0)), mode=Mode.PRIVATE) as cut_extrude2_sk3:
        with Locations(Location((45.5, 50.5, 0), (0, 0, 270))):
            Circle(SKETCH3_R_2)
    cut_extrude2_tool3 = extrude(cut_extrude2_sk3.sketch, amount=-CUT_EXTRUDE2_REACH, mode=Mode.PRIVATE) & part_1.part
    # Sketch3 → Cut-Extrude2 (cut, up to next)
    with BuildSketch(Plane(origin=(0, 5, 0), x_dir=(1, 0, 0), z_dir=(0, 1, 0)), mode=Mode.PRIVATE) as cut_extrude2_sk4:
        with Locations(Location((14.5, 50.5, 0), (0, 0, 270))):
            Circle(SKETCH3_R_2)
    cut_extrude2_tool4 = extrude(cut_extrude2_sk4.sketch, amount=-CUT_EXTRUDE2_REACH, mode=Mode.PRIVATE) & part_1.part
    # Sketch3 → Cut-Extrude2 (cut, up to next)
    with BuildSketch(Plane(origin=(0, 5, 0), x_dir=(1, 0, 0), z_dir=(0, 1, 0)), mode=Mode.PRIVATE) as cut_extrude2_sk5:
        with Locations(Location((14.5, 19.5, 0), (0, 0, 270))):
            Circle(SKETCH3_R_2)
    cut_extrude2_tool5 = extrude(cut_extrude2_sk5.sketch, amount=-CUT_EXTRUDE2_REACH, mode=Mode.PRIVATE) & part_1.part
    # Sketch3 → Cut-Extrude2 (cut, up to next)
    with BuildSketch(Plane(origin=(0, 5, 0), x_dir=(1, 0, 0), z_dir=(0, 1, 0)), mode=Mode.PRIVATE) as cut_extrude2_sk6:
        with Locations(Location((30, -30, 0), (0, 0, 270))):
            Circle(SKETCH3_R_3)
    cut_extrude2_tool6 = extrude(cut_extrude2_sk6.sketch, amount=-CUT_EXTRUDE2_REACH, mode=Mode.PRIVATE) & part_1.part
    # Sketch3 → Cut-Extrude2 (cut, up to next)
    with BuildSketch(Plane(origin=(0, 5, 0), x_dir=(1, 0, 0), z_dir=(0, 1, 0)), mode=Mode.PRIVATE) as cut_extrude2_sk7:
        with Locations(Location((48.25, -30, 0), (0, 0, 270))):
            Circle(SKETCH3_R_4)
    cut_extrude2_tool7 = extrude(cut_extrude2_sk7.sketch, amount=-CUT_EXTRUDE2_REACH, mode=Mode.PRIVATE) & part_1.part
    # Sketch3 → Cut-Extrude2 (cut, up to next)
    with BuildSketch(Plane(origin=(0, 5, 0), x_dir=(1, 0, 0), z_dir=(0, 1, 0)), mode=Mode.PRIVATE) as cut_extrude2_sk8:
        with Locations(Location((11.75, -30, 0), (0, 0, 270))):
            Circle(SKETCH3_R_4)
    cut_extrude2_tool8 = extrude(cut_extrude2_sk8.sketch, amount=-CUT_EXTRUDE2_REACH, mode=Mode.PRIVATE) & part_1.part
    add(cut_extrude2_tool1.solids().sort_by_distance((30, 5, -35))[0], mode=Mode.SUBTRACT)
    add(cut_extrude2_tool2.solids().sort_by_distance((45.5, 5, -19.5))[0], mode=Mode.SUBTRACT)
    add(cut_extrude2_tool3.solids().sort_by_distance((45.5, 5, -50.5))[0], mode=Mode.SUBTRACT)
    add(cut_extrude2_tool4.solids().sort_by_distance((14.5, 5, -50.5))[0], mode=Mode.SUBTRACT)
    add(cut_extrude2_tool5.solids().sort_by_distance((14.5, 5, -19.5))[0], mode=Mode.SUBTRACT)
    add(cut_extrude2_tool6.solids().sort_by_distance((30, 5, 30))[0], mode=Mode.SUBTRACT)
    add(cut_extrude2_tool7.solids().sort_by_distance((48.25, 5, 30))[0], mode=Mode.SUBTRACT)
    add(cut_extrude2_tool8.solids().sort_by_distance((11.75, 5, 30))[0], mode=Mode.SUBTRACT)

    # Sketch4 → Cut-Extrude3 (cut, through all)
    with BuildSketch(Plane.ZY):
        with Locations((62.5, 20)):
            Circle(SKETCH4_R)
        with Locations((-62.5, 20)):
            Circle(SKETCH4_R)
    extrude(amount=-CUT_EXTRUDE3_DEPTH, mode=Mode.SUBTRACT)


solid = part_1.part
